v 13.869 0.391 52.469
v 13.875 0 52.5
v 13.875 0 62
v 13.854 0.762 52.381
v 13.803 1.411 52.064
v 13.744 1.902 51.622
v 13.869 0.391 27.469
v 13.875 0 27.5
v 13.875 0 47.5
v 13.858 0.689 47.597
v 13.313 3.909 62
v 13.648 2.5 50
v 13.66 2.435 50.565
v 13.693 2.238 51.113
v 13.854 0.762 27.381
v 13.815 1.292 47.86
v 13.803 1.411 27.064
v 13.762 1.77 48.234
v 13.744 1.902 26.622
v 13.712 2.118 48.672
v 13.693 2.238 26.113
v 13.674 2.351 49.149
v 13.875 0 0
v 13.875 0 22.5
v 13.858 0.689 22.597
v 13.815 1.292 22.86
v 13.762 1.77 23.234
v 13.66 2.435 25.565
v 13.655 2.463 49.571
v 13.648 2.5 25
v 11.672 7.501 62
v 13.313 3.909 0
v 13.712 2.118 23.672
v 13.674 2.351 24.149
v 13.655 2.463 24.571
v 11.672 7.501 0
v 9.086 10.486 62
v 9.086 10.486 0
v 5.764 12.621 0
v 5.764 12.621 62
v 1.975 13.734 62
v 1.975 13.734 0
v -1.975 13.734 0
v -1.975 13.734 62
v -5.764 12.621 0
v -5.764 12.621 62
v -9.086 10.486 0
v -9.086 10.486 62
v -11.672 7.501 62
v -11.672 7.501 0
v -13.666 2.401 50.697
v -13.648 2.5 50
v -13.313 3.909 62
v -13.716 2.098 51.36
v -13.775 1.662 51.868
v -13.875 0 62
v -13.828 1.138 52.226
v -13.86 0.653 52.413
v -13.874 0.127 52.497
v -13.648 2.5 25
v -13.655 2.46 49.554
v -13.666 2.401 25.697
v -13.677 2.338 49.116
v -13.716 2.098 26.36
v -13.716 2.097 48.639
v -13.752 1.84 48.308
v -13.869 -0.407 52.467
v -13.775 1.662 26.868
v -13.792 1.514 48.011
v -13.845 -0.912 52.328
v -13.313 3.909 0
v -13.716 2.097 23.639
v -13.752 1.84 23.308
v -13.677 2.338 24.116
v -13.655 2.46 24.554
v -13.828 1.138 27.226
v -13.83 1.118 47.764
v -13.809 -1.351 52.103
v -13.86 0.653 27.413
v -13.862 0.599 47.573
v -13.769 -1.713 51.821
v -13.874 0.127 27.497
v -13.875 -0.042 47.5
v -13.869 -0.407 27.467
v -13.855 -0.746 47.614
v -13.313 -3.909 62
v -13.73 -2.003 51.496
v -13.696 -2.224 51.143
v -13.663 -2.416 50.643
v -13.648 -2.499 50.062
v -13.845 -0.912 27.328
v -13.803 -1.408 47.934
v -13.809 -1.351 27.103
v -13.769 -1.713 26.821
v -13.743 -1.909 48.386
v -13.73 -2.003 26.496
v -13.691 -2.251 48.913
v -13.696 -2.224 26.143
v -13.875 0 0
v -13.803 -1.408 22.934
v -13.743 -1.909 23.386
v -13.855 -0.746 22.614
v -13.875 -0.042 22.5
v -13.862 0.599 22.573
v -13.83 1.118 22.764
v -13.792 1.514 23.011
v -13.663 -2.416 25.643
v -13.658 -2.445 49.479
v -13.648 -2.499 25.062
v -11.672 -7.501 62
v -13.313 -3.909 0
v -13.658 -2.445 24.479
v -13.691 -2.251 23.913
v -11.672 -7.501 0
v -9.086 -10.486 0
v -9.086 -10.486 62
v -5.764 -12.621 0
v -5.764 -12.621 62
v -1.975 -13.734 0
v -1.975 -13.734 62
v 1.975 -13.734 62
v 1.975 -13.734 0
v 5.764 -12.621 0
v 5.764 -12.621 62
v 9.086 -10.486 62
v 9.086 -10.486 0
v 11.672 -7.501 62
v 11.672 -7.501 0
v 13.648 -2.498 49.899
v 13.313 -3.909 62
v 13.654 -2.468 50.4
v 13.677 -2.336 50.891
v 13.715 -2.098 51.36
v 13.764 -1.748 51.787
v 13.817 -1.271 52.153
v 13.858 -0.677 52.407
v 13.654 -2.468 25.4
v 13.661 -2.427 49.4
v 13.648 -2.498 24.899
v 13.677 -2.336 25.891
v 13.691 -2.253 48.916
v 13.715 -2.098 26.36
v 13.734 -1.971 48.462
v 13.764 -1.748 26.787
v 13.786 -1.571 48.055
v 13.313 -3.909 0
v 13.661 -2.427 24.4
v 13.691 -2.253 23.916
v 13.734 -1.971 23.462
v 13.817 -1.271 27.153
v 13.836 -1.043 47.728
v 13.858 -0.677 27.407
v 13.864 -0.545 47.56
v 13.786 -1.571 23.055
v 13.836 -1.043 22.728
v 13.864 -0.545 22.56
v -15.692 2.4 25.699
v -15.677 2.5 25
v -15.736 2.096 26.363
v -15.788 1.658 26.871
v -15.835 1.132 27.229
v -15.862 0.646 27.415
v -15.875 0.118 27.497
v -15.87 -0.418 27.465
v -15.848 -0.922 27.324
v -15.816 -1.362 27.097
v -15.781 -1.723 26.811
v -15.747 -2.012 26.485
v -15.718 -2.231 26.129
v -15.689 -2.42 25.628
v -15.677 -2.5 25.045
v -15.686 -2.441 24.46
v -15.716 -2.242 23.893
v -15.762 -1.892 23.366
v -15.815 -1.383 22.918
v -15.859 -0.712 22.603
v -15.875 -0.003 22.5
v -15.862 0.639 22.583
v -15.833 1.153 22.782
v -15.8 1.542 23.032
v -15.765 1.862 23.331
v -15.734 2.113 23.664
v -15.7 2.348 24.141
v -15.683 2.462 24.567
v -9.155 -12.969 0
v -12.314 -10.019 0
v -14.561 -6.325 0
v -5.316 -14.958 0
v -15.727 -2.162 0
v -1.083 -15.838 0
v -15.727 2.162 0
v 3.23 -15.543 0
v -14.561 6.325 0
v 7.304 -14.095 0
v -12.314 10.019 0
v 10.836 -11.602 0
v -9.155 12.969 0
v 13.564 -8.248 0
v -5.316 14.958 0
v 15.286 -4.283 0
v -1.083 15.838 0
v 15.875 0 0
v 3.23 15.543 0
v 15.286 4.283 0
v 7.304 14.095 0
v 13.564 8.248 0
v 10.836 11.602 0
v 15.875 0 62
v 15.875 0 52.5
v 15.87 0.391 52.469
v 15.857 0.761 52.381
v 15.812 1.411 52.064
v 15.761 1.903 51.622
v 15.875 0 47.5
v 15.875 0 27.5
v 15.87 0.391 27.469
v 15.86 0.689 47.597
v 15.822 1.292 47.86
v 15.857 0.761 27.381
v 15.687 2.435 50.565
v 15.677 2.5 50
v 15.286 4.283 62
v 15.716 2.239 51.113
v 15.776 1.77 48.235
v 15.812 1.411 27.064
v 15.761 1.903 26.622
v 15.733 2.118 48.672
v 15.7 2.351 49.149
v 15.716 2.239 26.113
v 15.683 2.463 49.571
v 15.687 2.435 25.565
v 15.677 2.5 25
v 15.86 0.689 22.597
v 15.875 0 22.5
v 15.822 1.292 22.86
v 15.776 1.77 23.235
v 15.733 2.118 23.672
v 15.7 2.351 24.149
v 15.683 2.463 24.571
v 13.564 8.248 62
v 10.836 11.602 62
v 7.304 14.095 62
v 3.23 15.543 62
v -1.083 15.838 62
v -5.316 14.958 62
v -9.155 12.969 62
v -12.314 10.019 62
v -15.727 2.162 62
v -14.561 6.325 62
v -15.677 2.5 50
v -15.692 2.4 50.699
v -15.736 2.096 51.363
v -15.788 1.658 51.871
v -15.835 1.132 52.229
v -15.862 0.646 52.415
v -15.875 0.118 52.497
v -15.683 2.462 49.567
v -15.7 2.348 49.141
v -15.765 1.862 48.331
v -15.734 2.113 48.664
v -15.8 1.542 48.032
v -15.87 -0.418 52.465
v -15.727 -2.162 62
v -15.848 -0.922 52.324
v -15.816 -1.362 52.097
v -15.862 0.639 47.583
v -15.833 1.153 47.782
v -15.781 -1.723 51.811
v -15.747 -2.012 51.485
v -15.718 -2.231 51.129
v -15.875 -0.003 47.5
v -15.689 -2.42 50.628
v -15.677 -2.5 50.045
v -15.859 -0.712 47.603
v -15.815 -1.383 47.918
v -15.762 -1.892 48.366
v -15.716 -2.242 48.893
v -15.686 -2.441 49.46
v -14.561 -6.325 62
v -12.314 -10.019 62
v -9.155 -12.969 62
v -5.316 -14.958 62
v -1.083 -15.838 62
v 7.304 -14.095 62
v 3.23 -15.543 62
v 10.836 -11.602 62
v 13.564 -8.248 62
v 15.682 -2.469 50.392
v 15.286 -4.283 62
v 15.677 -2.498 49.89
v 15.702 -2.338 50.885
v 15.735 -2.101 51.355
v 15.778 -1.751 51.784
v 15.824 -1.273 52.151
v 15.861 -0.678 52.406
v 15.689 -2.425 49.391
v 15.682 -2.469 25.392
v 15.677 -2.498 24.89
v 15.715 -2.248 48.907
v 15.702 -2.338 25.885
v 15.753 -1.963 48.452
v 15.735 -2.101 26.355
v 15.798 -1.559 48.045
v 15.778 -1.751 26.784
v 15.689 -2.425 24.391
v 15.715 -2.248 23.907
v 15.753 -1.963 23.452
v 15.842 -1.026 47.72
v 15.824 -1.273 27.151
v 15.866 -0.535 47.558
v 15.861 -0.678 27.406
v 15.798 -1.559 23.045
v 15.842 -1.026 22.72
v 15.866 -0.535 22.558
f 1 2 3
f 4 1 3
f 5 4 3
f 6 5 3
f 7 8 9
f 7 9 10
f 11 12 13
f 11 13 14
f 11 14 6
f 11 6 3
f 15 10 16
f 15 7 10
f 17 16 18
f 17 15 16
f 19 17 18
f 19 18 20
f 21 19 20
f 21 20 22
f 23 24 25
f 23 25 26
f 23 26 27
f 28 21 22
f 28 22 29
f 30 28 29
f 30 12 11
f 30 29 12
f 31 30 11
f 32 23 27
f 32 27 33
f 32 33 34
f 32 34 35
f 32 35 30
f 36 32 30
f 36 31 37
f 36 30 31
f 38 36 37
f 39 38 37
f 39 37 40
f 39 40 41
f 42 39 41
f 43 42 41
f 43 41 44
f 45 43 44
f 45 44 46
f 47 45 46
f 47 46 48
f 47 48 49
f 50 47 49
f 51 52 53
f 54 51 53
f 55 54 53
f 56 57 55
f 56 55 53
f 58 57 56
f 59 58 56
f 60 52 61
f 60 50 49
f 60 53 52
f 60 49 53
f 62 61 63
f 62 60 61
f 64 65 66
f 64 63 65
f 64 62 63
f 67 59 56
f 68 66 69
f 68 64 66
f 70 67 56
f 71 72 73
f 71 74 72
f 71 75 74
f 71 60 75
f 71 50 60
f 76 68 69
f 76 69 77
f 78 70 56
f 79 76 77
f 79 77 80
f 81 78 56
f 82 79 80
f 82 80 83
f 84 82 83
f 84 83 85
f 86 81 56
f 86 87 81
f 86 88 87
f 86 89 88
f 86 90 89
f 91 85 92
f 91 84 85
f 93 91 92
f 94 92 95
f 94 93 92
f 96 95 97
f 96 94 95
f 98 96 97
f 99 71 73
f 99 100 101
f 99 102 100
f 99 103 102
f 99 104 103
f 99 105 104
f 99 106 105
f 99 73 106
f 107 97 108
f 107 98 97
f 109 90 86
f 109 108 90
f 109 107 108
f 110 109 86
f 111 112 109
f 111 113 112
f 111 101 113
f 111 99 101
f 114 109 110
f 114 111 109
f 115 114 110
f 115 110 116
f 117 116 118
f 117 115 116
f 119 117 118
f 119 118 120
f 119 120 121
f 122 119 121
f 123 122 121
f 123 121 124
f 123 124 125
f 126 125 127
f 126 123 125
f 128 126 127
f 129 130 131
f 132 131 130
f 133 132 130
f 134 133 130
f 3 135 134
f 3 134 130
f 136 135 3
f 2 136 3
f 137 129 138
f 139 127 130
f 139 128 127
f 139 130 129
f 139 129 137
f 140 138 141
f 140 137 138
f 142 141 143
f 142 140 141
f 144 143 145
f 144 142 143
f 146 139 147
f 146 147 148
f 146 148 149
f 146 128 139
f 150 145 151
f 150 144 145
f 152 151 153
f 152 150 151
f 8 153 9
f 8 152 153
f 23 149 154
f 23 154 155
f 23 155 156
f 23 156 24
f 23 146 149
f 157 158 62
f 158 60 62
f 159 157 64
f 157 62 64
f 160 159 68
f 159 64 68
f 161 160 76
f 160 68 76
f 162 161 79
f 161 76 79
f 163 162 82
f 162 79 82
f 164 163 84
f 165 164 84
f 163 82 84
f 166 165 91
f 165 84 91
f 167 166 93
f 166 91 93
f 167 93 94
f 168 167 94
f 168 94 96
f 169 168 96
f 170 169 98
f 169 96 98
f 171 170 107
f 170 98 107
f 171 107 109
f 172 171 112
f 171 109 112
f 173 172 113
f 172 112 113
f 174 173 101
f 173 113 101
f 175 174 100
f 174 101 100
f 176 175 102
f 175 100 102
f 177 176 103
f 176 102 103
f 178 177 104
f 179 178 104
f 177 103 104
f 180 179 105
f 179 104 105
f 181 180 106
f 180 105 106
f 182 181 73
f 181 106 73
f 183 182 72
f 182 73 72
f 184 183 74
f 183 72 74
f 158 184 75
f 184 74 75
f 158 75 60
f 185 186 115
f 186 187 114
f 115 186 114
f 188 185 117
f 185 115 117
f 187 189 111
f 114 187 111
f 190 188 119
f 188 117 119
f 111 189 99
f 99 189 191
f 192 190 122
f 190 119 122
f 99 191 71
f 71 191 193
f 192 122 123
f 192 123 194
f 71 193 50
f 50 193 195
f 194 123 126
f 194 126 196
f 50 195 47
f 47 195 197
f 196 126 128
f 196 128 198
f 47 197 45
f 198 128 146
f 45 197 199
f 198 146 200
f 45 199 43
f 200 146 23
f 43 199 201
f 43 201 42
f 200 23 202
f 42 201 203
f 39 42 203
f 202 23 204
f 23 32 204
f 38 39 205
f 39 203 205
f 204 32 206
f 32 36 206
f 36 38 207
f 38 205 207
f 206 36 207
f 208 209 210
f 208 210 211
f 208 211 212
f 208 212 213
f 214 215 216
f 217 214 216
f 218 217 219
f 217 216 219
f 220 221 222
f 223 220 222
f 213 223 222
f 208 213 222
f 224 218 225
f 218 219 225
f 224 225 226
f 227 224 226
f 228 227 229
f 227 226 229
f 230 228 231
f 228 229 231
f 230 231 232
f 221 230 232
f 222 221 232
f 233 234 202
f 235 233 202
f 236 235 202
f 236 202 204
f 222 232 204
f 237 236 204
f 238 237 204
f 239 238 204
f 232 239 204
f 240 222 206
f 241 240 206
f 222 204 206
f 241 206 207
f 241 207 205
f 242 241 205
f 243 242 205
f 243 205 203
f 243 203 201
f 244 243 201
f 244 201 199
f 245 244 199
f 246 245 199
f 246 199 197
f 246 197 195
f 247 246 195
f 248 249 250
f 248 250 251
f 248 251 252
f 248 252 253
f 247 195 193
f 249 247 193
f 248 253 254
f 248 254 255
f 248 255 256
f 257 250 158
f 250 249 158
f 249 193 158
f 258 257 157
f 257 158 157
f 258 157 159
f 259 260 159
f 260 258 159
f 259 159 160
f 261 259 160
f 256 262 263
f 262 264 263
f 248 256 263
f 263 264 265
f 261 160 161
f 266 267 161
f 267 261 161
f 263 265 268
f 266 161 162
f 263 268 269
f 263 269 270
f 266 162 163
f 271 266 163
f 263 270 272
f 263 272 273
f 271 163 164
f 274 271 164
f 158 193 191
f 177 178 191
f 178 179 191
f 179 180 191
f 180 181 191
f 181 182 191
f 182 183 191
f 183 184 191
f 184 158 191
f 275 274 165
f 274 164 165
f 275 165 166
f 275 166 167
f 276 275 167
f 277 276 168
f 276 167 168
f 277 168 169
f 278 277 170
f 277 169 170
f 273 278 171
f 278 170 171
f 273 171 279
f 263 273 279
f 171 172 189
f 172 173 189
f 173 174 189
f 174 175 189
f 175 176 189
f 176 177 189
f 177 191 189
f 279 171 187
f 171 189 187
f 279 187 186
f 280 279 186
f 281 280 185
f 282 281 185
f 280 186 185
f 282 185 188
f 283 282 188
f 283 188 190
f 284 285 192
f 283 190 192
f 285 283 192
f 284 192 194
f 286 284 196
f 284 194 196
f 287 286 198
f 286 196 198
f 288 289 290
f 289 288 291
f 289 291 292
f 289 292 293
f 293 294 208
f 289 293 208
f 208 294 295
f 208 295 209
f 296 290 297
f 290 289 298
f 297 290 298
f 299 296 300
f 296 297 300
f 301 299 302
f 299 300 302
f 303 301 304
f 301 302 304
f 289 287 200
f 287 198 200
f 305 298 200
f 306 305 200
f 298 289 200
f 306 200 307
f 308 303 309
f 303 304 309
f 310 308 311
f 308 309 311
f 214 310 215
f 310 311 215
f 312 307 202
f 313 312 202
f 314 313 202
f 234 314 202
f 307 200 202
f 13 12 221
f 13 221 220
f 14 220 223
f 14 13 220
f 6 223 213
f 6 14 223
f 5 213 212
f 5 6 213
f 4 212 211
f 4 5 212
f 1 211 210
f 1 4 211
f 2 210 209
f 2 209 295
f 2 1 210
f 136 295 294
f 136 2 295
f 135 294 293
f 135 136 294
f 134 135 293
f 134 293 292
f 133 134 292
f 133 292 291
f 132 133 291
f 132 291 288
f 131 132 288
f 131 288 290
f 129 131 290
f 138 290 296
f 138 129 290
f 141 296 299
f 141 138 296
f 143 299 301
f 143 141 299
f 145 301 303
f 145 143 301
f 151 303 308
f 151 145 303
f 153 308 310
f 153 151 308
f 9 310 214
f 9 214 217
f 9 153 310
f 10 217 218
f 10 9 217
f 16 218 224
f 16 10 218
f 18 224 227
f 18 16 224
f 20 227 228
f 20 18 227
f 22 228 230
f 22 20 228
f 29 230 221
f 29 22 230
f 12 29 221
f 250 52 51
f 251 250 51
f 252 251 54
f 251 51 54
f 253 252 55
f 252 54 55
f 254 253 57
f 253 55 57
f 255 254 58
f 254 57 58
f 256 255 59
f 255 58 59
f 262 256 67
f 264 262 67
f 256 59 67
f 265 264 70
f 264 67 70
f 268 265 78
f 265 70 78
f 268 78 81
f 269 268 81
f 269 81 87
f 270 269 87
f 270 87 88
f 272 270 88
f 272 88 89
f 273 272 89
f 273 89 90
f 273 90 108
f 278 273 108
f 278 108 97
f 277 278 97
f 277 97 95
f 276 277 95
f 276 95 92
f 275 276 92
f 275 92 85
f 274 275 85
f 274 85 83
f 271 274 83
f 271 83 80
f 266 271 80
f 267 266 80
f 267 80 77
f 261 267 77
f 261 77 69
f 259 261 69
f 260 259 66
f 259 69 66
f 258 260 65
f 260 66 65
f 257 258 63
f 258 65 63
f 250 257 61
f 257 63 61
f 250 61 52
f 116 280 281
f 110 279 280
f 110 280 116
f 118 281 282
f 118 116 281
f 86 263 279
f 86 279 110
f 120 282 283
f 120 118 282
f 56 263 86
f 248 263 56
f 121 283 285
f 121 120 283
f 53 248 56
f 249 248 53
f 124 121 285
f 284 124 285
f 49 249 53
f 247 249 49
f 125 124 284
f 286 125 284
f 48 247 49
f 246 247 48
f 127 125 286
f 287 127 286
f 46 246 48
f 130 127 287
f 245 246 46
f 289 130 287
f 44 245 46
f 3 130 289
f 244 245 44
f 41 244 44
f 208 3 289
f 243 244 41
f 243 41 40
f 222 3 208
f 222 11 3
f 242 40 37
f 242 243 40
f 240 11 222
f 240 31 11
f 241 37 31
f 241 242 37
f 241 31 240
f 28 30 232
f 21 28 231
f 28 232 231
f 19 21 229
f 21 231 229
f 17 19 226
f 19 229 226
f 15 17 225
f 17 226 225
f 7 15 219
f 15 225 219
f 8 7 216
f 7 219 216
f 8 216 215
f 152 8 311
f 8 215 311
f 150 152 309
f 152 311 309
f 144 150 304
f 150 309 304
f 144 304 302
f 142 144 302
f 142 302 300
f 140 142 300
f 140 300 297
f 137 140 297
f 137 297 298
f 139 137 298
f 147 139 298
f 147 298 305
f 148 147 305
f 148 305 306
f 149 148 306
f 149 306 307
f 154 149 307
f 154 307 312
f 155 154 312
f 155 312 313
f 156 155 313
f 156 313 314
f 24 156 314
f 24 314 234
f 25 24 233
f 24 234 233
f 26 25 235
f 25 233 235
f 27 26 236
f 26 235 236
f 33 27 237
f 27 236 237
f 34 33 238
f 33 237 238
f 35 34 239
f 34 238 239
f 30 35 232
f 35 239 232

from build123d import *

# Parameters (mm, degrees)
F0_R     = 15.875
F0_R_2   = 13.875
F1_DEPTH = 62
F2_R     = 2.5
F3_DEPTH = 25


with BuildPart() as f1:
    # F0 (on Top) → F1 (new body)
    with BuildSketch(Plane.XY):
        Circle(F0_R)
        Circle(F0_R_2, mode=Mode.SUBTRACT)
    extrude(amount=F1_DEPTH)

    # F2 (on Right) → F3 (cut, symmetric)
    with BuildSketch(Plane.YZ):
        with Locations((0, 50)):
            Circle(F2_R)
        with Locations((0, 25)):
            Circle(F2_R)
    extrude(amount=F3_DEPTH, both=True, mode=Mode.SUBTRACT)


solid = f1.part
